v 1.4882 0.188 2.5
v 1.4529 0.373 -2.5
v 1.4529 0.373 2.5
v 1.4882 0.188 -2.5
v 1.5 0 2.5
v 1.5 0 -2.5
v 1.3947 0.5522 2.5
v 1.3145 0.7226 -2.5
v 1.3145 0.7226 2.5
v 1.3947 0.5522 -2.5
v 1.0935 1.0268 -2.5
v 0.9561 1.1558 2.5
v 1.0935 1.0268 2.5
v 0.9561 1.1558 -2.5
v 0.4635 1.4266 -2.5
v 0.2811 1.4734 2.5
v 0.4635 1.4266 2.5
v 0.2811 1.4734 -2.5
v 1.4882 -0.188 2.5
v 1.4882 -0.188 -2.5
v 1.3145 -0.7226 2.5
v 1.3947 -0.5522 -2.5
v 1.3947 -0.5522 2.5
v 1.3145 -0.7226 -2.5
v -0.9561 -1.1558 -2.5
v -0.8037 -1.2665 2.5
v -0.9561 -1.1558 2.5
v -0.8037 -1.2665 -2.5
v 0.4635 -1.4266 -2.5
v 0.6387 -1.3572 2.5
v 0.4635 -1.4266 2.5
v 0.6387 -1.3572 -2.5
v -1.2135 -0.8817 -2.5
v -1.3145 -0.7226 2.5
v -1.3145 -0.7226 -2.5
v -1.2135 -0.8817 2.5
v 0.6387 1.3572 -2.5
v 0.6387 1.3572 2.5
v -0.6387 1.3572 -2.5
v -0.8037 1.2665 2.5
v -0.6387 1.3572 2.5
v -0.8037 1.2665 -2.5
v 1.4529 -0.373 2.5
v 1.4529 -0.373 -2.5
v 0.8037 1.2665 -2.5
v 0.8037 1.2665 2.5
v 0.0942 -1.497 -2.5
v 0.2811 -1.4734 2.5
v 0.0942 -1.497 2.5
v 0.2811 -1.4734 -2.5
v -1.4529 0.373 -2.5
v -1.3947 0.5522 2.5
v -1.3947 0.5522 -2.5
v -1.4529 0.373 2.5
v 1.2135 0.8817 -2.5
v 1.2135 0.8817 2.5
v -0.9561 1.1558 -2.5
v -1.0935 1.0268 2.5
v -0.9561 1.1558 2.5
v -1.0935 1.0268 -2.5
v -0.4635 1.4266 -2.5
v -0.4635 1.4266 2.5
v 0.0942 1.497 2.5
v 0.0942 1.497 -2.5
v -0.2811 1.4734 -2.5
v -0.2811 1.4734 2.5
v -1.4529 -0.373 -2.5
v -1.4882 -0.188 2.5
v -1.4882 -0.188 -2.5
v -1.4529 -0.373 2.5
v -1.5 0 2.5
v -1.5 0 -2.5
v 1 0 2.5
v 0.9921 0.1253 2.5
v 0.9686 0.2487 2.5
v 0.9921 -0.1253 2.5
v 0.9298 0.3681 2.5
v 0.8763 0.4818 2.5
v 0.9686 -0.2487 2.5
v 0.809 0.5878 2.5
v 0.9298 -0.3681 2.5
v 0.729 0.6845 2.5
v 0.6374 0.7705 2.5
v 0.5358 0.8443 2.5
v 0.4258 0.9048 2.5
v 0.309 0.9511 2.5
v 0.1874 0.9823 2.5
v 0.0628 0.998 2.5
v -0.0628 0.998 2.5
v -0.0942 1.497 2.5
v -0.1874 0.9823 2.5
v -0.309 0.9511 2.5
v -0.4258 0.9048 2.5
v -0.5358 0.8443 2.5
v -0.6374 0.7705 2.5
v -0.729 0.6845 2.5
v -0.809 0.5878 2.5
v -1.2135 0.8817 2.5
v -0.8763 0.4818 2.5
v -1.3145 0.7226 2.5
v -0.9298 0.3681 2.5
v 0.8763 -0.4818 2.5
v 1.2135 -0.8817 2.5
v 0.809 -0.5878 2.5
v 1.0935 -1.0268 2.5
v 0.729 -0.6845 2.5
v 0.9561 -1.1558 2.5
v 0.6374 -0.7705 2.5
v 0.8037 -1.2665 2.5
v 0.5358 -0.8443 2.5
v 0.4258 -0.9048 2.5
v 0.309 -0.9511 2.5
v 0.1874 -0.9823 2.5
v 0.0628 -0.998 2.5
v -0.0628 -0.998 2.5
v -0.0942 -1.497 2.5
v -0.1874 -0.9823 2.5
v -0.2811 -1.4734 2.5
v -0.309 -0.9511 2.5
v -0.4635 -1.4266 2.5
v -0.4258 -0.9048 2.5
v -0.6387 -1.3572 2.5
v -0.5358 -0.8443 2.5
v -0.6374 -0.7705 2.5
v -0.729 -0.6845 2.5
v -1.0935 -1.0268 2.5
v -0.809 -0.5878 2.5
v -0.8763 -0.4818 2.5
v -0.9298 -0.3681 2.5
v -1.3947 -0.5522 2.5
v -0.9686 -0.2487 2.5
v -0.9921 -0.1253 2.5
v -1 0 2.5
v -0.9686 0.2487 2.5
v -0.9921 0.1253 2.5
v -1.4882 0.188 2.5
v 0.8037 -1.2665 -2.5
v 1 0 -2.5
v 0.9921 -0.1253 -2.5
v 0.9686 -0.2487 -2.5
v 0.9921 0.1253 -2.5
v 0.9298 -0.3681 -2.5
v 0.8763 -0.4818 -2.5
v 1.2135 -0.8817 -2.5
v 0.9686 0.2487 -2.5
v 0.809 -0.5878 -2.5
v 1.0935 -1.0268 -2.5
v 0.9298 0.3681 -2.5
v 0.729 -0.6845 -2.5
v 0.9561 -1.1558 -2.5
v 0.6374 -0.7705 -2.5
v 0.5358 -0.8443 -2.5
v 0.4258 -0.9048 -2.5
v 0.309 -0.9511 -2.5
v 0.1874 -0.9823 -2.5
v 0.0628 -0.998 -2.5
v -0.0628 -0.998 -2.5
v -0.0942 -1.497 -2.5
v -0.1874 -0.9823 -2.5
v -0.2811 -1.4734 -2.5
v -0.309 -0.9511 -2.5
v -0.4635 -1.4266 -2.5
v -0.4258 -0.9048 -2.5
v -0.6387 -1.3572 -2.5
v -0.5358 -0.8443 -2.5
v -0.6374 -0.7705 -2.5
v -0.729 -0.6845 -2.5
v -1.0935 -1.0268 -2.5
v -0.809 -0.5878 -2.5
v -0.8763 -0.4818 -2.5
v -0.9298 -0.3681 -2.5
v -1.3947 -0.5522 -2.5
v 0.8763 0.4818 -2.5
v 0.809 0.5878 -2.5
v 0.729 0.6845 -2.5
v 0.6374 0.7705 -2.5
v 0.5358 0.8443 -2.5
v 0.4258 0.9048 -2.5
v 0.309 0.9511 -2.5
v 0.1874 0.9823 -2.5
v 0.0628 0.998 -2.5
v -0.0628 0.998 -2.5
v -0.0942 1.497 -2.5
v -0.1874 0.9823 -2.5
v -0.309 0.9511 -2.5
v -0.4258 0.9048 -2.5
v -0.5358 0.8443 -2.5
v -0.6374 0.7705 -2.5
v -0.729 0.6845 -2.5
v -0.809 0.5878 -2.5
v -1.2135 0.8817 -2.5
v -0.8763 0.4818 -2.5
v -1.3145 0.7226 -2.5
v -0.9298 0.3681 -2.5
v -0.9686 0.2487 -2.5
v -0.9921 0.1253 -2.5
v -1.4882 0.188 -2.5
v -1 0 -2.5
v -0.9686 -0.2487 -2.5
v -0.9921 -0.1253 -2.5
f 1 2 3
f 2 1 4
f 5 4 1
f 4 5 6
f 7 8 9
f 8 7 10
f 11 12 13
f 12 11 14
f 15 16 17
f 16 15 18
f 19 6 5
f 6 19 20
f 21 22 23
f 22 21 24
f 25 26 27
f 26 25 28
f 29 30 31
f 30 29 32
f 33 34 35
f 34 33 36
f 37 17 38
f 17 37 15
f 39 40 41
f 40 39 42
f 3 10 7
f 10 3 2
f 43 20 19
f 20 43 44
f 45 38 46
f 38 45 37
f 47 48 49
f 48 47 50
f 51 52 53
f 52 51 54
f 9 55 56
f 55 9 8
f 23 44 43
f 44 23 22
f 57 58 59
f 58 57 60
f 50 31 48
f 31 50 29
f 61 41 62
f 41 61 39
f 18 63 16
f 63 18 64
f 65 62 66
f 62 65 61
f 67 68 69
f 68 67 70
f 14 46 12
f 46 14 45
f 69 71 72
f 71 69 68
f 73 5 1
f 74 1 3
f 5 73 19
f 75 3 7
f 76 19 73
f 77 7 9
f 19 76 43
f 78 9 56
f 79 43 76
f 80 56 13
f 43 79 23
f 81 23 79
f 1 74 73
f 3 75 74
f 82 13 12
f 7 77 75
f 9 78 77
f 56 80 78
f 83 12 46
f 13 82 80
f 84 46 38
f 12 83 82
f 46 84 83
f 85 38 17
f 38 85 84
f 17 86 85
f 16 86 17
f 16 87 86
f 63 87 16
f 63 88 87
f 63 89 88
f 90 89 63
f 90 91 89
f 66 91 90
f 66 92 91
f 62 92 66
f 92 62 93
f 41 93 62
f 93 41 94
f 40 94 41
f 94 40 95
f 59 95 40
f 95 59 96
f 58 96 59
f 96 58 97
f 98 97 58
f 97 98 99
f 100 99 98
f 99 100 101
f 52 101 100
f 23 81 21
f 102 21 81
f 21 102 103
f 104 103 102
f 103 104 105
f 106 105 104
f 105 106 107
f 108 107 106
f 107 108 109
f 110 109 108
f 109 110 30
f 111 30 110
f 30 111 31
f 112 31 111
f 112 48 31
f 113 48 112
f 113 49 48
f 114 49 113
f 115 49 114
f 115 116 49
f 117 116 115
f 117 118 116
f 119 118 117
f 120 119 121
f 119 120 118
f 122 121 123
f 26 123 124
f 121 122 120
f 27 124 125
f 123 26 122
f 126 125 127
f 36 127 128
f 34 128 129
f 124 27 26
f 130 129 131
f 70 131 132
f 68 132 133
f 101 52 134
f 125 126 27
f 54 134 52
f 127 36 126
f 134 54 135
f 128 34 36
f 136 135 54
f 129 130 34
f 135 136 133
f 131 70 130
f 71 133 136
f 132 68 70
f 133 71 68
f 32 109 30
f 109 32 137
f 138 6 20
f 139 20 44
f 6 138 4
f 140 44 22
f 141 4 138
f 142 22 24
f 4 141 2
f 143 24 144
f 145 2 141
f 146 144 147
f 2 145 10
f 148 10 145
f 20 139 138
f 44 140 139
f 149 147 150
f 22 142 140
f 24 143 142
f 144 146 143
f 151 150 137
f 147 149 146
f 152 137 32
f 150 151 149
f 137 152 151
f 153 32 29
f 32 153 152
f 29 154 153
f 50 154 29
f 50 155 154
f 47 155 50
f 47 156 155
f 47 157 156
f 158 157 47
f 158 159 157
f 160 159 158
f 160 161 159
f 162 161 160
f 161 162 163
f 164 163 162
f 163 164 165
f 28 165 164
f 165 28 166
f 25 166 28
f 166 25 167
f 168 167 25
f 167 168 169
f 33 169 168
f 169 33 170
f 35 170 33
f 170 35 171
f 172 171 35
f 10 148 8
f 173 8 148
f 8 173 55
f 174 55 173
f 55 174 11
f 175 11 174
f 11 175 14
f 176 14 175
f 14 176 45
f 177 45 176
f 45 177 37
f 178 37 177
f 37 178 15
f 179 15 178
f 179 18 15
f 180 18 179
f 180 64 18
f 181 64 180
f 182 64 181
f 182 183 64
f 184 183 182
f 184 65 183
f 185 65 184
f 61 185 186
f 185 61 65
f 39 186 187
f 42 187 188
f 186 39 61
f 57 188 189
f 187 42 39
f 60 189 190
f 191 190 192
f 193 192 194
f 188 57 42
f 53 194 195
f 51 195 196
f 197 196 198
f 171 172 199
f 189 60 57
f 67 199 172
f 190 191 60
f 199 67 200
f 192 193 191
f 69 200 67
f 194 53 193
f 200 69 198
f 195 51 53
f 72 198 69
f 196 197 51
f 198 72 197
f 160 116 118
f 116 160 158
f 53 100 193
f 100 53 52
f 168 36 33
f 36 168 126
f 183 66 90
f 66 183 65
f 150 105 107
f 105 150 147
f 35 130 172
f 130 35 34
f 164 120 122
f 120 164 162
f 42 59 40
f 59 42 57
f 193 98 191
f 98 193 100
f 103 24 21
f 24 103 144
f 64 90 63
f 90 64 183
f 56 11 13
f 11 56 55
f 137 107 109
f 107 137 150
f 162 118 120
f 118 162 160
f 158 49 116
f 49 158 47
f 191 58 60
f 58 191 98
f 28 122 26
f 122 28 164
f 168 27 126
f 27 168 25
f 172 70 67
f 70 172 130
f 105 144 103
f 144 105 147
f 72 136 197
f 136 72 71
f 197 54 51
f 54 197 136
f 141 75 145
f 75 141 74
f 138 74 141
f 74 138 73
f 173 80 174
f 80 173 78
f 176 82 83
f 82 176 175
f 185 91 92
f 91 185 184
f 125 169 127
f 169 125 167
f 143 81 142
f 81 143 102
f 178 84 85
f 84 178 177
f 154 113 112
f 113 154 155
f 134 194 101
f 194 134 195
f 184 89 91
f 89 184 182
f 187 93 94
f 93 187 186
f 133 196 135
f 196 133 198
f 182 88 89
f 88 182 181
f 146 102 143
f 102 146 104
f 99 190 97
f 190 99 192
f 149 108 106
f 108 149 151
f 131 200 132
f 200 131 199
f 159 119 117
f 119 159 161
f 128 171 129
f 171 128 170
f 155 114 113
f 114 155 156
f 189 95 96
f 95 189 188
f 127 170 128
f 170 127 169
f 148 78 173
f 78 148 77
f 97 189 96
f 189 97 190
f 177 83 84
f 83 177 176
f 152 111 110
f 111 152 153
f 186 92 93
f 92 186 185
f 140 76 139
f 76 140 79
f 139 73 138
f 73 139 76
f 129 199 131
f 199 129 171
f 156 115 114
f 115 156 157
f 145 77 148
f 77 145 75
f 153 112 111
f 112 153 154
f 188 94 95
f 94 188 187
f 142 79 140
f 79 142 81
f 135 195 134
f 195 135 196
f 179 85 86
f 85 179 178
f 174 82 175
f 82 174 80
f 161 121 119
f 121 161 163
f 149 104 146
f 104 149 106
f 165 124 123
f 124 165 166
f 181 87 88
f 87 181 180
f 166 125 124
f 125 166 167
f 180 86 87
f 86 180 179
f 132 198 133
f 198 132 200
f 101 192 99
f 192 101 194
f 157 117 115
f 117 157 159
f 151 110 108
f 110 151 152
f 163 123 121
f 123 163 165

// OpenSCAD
$fn = 50;


difference() {
	union() {
		translate(v = [0, 0, -2.5000000000]) {
			cylinder(h = 5, r = 1.5000000000);
		}
	}
	union() {
		translate(v = [0, 0, -100.0000000000]) {
			cylinder(h = 200, r = 1.0000000000);
		}
	}
}
